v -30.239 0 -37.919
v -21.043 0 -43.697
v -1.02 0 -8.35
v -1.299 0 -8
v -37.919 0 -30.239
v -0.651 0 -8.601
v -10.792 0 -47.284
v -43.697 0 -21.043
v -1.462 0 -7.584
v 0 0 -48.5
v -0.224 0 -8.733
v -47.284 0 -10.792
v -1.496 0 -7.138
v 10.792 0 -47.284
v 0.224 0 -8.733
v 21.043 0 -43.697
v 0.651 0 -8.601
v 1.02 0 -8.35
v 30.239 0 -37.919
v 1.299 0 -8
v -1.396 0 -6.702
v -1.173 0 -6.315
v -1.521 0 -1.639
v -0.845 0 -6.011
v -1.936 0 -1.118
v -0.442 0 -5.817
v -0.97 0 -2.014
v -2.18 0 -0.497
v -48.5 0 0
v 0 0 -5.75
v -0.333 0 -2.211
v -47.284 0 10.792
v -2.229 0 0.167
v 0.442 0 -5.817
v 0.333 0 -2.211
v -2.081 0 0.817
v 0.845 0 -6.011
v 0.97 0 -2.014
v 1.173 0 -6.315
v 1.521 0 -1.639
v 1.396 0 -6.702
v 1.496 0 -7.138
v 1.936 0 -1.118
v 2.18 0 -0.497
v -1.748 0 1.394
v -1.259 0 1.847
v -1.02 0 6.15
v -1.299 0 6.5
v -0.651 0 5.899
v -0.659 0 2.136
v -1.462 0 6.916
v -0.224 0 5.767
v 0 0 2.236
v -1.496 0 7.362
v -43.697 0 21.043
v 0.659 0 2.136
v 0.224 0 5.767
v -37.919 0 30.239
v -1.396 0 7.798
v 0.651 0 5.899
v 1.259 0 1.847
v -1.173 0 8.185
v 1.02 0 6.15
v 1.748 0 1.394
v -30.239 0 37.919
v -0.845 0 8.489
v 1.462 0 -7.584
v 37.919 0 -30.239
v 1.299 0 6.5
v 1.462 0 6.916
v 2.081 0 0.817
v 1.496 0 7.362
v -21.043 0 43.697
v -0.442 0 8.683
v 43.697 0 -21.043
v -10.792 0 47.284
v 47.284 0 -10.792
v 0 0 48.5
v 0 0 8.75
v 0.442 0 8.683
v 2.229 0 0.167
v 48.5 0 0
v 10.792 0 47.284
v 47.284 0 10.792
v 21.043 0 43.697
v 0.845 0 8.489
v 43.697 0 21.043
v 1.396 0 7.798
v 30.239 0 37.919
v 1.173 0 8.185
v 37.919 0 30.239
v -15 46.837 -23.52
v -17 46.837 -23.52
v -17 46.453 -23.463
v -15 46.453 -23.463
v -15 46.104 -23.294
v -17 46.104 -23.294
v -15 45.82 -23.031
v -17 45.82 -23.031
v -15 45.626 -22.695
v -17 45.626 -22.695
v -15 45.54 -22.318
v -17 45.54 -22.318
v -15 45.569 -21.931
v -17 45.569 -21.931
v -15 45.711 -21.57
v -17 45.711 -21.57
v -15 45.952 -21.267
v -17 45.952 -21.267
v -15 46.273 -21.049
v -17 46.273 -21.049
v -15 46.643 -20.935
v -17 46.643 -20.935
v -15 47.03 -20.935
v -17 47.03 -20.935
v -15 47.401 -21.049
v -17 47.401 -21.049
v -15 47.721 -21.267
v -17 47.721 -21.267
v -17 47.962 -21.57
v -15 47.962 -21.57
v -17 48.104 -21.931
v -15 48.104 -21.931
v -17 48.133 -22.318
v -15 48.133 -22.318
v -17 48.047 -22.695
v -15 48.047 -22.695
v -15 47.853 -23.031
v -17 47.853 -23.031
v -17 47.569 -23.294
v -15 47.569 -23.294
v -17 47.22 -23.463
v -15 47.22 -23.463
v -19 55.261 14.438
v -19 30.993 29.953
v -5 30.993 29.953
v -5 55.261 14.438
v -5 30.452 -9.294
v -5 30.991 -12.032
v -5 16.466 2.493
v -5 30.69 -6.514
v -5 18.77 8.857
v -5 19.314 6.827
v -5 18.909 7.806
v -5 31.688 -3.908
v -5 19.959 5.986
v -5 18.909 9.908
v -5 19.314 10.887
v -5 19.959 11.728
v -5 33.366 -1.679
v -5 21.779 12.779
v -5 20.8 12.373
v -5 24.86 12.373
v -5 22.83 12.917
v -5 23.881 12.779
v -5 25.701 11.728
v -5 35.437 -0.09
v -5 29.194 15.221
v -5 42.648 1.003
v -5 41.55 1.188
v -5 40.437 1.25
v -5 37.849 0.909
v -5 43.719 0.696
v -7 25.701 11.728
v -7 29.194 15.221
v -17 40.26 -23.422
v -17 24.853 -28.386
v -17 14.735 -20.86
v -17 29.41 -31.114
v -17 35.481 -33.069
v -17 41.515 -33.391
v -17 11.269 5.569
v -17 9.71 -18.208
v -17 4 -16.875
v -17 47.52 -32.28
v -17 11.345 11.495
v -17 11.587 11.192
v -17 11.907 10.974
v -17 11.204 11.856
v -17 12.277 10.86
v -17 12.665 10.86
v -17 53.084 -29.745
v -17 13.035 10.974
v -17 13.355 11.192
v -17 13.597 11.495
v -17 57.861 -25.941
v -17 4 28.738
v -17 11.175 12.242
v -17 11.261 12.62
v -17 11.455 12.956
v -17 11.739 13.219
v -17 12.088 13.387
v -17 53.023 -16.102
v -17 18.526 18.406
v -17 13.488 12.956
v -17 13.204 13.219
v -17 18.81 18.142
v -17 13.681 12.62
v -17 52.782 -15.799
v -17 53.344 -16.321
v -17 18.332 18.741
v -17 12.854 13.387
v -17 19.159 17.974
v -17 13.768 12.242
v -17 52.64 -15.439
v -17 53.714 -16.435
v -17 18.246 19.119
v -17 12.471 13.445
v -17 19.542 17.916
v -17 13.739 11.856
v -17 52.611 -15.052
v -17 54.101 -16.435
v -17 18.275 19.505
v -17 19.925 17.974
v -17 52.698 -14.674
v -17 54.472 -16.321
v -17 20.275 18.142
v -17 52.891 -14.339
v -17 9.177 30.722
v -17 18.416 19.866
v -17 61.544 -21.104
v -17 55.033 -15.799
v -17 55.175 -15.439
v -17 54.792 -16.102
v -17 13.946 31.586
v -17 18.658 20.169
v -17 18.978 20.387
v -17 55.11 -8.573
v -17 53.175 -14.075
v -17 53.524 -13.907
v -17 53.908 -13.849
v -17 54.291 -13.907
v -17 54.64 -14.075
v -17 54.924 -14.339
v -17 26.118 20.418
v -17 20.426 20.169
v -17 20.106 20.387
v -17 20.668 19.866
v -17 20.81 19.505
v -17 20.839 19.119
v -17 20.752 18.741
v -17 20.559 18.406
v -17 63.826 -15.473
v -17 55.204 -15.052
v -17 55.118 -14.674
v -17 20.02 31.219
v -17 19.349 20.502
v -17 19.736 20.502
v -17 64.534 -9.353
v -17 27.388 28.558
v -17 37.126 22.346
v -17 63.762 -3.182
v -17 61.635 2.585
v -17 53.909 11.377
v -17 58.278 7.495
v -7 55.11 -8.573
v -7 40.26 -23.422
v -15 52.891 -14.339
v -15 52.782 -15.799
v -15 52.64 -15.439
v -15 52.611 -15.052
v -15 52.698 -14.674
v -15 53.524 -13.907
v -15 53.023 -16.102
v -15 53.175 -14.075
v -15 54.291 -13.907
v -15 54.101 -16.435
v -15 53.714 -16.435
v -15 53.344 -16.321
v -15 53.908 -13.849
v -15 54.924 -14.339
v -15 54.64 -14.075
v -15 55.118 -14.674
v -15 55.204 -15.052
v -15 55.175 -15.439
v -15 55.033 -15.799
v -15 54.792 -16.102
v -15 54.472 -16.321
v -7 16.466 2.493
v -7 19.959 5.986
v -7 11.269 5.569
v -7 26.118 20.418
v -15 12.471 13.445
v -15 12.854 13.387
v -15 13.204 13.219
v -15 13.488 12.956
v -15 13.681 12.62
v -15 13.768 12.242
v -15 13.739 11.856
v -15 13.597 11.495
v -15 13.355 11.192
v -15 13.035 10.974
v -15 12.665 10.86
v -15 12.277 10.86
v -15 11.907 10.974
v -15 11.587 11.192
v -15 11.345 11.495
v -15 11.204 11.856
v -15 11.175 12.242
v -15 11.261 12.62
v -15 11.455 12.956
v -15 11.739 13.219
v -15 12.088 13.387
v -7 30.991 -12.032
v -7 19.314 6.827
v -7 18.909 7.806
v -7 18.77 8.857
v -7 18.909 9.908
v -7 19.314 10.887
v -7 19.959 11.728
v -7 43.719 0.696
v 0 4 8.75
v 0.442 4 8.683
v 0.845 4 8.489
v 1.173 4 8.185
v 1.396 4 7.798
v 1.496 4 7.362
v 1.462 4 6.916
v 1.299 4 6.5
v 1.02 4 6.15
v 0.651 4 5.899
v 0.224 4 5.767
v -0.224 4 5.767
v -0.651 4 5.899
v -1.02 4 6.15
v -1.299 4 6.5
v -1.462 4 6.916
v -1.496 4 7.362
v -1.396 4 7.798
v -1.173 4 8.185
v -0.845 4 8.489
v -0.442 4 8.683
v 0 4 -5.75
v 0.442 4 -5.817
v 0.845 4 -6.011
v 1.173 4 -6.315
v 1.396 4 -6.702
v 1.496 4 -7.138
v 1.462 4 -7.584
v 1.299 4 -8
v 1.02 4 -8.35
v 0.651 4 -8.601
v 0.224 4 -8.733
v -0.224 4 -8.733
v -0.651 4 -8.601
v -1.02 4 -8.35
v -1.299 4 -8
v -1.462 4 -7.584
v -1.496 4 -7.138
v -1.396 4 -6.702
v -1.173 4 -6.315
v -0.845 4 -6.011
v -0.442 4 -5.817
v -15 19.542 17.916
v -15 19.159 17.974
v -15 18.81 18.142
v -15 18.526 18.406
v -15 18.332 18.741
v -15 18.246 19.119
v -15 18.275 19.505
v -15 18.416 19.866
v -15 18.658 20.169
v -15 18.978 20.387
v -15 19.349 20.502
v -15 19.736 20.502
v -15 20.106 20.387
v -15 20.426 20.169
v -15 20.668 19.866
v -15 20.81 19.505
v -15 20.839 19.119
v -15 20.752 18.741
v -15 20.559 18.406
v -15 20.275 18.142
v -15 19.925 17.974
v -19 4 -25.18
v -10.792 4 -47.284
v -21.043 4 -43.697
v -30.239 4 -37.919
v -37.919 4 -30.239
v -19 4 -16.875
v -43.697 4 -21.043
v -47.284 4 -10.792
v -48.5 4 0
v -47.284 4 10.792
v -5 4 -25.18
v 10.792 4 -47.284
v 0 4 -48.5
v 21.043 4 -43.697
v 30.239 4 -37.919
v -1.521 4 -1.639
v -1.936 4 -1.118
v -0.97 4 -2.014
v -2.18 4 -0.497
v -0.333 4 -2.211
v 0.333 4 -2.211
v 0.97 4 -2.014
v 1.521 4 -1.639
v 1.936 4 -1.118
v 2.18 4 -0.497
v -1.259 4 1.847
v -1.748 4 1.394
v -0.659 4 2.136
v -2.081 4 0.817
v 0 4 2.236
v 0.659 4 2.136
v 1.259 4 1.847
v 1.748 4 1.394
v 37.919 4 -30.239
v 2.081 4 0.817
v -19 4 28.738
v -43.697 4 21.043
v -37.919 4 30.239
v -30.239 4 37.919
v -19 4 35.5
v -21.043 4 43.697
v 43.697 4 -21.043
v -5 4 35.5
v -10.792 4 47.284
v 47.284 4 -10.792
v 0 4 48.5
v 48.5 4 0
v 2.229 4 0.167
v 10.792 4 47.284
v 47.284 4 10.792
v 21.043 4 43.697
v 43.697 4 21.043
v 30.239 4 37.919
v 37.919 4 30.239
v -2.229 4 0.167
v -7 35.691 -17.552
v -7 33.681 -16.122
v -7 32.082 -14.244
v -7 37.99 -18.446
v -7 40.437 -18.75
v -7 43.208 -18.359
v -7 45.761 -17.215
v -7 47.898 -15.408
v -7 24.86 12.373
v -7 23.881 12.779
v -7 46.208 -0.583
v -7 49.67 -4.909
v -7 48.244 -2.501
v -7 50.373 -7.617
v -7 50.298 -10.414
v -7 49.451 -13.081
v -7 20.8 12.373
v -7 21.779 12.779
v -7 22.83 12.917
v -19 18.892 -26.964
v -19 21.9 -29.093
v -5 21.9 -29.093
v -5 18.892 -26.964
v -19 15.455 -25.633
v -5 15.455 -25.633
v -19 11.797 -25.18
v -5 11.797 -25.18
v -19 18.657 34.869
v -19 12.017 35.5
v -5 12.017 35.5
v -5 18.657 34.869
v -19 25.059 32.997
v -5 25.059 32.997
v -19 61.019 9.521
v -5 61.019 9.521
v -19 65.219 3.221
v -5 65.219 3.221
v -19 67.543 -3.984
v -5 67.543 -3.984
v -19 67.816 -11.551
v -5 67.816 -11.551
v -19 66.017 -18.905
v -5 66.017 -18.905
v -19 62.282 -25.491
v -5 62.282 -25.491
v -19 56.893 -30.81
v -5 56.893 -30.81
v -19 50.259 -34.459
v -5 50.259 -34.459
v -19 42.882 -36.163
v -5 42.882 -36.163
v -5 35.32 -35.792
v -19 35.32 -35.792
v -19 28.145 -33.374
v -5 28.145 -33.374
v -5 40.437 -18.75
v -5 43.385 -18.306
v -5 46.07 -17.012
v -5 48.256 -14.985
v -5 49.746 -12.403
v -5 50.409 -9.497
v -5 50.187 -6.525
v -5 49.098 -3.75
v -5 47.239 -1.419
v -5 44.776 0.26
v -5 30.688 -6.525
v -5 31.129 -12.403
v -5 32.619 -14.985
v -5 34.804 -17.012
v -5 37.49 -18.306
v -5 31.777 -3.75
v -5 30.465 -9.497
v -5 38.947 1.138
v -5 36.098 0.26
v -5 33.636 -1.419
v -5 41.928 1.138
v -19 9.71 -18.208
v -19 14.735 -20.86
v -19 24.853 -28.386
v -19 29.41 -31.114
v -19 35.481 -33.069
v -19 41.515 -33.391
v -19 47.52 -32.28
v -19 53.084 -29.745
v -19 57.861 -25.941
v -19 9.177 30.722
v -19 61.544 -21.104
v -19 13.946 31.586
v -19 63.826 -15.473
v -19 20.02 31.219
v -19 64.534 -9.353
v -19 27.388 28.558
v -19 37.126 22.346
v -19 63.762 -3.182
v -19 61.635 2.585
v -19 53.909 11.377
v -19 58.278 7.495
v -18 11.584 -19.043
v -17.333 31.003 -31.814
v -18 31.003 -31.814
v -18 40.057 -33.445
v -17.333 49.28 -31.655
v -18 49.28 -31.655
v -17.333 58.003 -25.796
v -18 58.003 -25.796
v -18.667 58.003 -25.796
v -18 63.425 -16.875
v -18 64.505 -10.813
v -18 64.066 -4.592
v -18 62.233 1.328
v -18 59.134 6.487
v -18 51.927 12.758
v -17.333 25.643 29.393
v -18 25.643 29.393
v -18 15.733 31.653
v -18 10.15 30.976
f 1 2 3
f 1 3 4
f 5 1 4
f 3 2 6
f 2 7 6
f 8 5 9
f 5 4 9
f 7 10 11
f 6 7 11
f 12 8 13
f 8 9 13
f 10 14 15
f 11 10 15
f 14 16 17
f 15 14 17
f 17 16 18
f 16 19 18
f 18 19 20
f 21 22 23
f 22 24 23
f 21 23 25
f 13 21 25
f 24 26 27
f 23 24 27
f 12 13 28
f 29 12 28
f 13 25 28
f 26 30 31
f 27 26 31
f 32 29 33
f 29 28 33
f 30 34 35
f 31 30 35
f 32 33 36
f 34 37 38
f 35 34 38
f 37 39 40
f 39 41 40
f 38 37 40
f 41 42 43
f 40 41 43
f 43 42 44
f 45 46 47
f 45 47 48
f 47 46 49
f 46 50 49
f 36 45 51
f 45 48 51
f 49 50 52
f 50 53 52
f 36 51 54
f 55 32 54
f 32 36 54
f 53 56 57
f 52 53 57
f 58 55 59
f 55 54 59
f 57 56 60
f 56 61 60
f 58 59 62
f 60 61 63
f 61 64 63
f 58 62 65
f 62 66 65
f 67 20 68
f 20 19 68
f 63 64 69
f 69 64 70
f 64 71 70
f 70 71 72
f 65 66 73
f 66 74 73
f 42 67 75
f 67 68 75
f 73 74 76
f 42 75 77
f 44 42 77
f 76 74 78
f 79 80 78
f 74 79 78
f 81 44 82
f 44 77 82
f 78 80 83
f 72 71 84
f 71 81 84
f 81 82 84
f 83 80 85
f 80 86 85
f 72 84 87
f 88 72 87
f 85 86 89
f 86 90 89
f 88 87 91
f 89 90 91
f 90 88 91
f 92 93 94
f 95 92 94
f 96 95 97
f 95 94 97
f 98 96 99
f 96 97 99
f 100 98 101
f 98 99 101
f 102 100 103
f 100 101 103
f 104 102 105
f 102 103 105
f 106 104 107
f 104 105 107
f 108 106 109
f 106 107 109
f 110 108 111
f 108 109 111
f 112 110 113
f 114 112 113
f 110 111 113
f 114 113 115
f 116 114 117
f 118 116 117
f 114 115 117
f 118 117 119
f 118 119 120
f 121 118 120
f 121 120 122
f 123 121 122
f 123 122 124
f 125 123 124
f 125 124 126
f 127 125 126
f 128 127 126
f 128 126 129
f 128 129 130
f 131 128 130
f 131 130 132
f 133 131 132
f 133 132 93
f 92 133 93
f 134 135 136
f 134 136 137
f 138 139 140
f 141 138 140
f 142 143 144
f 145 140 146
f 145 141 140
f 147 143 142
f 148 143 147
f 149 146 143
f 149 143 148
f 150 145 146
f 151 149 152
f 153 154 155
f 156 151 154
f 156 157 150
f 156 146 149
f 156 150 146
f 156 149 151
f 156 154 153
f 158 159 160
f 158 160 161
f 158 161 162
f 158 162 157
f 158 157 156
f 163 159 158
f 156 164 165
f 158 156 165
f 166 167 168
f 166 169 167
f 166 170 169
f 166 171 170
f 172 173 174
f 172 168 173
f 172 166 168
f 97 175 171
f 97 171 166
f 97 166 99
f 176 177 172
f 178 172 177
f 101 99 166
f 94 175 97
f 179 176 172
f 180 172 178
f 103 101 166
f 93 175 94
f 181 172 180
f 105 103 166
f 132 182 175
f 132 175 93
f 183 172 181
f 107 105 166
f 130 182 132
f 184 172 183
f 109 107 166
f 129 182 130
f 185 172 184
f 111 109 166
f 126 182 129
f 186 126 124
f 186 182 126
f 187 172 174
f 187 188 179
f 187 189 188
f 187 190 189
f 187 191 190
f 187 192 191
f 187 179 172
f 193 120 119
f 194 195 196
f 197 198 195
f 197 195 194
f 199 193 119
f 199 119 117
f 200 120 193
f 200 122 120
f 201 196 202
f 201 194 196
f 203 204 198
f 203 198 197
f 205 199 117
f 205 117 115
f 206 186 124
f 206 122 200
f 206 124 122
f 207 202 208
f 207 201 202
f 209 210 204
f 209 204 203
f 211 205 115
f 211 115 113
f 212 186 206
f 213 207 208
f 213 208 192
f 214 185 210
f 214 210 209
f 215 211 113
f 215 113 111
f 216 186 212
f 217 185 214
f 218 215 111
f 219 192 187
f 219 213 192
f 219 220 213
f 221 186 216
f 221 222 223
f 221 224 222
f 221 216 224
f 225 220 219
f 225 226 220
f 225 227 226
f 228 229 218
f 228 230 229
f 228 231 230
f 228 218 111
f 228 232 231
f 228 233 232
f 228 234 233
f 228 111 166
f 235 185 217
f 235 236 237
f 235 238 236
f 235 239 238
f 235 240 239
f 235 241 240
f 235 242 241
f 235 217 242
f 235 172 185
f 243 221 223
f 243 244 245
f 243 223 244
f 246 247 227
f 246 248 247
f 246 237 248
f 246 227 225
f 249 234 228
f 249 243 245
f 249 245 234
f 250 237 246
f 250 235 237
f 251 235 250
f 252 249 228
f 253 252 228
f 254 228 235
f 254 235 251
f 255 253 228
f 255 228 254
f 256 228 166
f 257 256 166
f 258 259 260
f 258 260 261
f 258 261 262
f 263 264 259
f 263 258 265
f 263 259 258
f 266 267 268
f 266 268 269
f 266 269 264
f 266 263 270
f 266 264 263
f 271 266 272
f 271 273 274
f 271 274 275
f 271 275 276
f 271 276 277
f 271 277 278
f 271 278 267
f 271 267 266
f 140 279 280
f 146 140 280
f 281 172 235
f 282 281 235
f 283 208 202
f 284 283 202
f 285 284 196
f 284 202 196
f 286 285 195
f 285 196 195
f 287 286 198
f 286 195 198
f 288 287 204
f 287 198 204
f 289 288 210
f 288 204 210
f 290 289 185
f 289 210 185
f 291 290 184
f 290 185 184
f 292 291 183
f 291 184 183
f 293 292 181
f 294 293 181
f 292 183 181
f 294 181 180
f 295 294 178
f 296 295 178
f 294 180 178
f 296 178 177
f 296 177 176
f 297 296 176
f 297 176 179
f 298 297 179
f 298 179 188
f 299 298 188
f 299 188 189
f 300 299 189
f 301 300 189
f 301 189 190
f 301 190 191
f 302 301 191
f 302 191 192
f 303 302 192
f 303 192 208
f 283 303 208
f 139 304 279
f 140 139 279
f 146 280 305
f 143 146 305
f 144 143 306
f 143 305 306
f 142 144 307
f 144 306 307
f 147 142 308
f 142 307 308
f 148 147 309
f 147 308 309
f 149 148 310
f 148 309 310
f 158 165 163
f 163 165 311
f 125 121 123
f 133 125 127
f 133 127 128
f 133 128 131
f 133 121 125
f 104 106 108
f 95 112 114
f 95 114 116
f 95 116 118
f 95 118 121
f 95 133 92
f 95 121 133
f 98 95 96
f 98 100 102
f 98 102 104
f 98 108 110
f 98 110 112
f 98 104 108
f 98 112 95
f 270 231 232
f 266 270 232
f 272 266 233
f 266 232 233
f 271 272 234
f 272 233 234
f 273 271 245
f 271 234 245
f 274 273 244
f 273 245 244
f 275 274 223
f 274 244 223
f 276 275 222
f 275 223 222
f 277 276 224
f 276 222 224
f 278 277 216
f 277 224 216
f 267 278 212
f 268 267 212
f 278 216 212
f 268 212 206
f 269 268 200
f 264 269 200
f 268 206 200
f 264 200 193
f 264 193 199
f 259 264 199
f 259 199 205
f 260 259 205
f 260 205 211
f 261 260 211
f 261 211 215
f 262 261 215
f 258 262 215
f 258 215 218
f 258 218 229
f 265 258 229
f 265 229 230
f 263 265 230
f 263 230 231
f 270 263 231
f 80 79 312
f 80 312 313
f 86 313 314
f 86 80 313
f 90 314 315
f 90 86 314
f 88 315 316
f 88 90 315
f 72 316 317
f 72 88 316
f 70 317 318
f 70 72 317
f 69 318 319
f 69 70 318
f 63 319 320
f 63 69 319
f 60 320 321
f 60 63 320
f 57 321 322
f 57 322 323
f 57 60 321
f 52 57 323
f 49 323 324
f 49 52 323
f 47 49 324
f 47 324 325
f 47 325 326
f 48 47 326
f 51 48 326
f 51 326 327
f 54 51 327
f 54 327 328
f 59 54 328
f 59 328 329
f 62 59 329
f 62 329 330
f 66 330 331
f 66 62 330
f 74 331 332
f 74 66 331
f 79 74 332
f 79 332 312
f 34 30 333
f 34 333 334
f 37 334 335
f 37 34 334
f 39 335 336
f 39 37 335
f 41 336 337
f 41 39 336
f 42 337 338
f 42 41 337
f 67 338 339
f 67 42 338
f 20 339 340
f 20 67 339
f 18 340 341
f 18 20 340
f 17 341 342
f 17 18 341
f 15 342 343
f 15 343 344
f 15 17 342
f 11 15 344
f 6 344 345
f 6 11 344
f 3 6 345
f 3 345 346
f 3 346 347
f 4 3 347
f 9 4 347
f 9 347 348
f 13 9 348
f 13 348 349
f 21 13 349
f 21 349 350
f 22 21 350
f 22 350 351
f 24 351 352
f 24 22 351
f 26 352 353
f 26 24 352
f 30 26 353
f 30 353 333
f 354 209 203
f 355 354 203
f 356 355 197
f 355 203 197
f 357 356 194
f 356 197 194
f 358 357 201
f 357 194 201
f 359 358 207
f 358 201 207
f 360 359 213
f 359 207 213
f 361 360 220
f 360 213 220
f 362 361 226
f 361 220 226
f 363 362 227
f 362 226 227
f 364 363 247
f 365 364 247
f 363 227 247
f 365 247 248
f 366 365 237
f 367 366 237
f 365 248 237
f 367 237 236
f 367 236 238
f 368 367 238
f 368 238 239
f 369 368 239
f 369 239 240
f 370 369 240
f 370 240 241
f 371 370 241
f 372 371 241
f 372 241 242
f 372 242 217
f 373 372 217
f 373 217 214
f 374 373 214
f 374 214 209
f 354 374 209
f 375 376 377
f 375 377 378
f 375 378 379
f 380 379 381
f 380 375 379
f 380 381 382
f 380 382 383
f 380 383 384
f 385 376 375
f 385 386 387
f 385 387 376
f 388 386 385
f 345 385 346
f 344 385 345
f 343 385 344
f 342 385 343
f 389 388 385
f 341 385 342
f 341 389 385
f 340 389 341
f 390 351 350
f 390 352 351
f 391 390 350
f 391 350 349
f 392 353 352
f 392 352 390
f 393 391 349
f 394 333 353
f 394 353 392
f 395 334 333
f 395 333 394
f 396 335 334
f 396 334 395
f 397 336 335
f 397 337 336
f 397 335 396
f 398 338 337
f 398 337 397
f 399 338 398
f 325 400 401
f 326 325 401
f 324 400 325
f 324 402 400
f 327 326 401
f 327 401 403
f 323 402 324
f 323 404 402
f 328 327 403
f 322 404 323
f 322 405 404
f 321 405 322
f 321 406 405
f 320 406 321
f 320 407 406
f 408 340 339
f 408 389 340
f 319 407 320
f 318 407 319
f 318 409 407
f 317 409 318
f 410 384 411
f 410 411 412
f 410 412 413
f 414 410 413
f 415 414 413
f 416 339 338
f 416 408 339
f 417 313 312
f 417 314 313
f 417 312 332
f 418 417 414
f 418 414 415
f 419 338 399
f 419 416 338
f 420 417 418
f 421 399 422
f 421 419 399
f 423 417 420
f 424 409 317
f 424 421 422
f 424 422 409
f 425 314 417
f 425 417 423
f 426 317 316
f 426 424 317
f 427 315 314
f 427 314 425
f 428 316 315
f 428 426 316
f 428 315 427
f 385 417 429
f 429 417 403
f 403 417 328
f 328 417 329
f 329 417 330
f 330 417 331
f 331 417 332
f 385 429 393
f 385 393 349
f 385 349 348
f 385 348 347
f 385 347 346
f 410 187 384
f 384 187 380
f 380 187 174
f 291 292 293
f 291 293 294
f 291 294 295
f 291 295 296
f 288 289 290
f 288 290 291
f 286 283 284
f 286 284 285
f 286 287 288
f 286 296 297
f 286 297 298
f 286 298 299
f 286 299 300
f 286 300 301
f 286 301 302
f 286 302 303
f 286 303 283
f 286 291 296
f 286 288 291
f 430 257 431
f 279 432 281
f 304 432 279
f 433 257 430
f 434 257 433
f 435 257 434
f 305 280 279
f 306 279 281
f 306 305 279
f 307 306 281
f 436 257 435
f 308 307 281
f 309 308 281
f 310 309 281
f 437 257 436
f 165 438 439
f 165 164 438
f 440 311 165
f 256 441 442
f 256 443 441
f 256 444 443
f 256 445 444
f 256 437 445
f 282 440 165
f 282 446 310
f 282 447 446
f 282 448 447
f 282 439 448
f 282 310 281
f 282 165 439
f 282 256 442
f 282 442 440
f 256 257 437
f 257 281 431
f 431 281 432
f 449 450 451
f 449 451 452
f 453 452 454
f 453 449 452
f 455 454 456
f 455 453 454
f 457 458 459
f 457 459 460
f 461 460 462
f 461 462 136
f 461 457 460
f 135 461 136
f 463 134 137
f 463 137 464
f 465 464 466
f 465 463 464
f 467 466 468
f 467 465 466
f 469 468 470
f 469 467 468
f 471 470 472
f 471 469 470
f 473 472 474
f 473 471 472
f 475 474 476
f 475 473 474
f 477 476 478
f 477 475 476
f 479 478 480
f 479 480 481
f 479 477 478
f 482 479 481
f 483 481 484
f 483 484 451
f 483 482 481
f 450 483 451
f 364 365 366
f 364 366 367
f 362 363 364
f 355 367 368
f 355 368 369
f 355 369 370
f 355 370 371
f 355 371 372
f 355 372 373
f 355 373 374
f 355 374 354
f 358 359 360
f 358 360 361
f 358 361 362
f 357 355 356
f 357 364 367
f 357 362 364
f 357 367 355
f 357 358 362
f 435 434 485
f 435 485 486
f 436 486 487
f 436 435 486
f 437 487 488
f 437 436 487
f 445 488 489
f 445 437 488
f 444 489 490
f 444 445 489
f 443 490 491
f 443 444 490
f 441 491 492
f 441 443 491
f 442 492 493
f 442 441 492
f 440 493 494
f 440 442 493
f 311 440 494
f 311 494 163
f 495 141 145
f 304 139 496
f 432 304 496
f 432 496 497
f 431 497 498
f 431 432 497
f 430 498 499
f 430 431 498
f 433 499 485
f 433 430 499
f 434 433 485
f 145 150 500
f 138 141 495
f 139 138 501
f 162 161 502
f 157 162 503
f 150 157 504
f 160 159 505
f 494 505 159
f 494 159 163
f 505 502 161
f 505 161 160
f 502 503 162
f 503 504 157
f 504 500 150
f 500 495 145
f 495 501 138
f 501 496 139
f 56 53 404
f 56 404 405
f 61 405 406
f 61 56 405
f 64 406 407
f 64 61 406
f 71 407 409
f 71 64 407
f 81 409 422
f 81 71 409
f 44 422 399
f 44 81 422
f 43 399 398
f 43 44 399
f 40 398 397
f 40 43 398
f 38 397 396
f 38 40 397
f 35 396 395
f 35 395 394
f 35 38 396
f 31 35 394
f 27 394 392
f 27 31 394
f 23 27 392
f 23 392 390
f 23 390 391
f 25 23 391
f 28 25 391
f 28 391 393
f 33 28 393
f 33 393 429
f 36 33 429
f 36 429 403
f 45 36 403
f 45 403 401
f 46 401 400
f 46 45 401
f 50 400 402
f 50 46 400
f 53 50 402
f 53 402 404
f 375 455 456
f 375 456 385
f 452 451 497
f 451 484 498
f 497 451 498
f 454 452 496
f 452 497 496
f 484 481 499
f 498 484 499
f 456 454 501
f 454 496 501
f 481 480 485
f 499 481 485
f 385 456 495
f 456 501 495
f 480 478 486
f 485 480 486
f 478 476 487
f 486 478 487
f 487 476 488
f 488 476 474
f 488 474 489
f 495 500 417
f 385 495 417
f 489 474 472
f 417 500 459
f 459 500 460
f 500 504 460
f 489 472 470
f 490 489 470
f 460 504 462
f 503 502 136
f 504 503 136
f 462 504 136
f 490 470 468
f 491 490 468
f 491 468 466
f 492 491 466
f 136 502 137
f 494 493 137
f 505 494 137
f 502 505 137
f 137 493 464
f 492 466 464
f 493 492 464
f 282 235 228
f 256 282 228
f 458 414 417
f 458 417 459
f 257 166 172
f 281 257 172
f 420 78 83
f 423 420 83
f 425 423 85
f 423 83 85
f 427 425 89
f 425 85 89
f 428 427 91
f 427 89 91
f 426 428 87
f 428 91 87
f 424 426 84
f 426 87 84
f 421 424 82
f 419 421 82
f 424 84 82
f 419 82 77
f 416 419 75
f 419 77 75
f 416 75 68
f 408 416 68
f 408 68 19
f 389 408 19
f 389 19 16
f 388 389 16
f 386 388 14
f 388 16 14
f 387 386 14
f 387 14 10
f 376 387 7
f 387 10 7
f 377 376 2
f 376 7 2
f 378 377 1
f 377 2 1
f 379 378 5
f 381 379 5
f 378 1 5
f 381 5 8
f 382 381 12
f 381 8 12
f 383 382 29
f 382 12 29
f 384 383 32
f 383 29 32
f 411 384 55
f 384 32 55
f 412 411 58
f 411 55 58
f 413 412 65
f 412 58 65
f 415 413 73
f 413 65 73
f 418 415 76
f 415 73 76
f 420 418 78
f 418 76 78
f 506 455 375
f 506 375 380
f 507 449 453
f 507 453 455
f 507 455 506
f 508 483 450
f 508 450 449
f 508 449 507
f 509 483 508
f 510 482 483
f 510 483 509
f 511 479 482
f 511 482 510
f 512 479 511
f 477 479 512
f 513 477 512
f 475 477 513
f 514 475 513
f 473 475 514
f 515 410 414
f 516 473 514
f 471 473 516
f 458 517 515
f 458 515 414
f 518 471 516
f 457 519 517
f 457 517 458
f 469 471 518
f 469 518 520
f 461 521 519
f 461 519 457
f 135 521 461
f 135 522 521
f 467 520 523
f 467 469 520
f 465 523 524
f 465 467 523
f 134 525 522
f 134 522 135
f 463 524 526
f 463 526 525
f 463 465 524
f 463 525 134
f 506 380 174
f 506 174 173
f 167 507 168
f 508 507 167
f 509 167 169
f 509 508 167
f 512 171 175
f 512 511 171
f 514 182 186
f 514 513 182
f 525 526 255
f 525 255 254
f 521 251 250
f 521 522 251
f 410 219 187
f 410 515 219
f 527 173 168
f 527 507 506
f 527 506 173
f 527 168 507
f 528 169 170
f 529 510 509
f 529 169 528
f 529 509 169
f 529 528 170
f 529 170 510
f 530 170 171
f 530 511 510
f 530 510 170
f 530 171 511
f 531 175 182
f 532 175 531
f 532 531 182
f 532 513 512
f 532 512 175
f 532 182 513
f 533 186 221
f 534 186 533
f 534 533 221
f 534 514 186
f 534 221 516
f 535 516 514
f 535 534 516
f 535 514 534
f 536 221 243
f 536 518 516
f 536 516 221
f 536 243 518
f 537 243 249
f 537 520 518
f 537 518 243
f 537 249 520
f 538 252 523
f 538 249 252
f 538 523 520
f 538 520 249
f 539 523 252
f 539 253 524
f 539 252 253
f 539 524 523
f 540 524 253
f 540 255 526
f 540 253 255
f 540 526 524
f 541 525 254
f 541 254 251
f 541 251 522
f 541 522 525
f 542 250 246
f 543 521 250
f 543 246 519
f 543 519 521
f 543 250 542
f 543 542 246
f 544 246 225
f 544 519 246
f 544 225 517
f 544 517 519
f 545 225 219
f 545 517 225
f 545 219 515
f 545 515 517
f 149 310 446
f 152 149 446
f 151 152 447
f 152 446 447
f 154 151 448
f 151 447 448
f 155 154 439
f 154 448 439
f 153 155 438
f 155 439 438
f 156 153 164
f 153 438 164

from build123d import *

# Parameters (mm, degrees)
SKETCH1_R                = 48.5
SKETCH1_R_2              = 1.5
SKETCH1_R_3              = 2.235591035
BOSS_EXTRUDE2_DEPTH      = 4
BOSS_EXTRUDE3_DEPTH      = 0.0001
BOSS_EXTRUDE3_DEPTH_BACK = 14
SKETCH6_R                = 10
CUT_EXTRUDE1_DEPTH       = 12
SKETCH11_R               = 1.3
CUT_EXTRUDE3_DEPTH       = 4
CUT_EXTRUDE4_DEPTH       = 2
CUT_EXTRUDE5_DEPTH       = 2


with BuildPart() as part:
    # Sketch1 → Boss-Extrude2 (new body)
    with BuildSketch(Plane(origin=(0, 0, 0), x_dir=(1, 0, 0), z_dir=(0, 1, 0))):
        with Locations(Location((0, 0, 0), (0, 0, 270))):
            Circle(SKETCH1_R)
        with Locations(Location((0, 7.25, 0), (0, 0, 270))):
            Circle(SKETCH1_R_2, mode=Mode.SUBTRACT)
        with Locations(Location((0, -7.25, 0), (0, 0, 270))):
            Circle(SKETCH1_R_2, mode=Mode.SUBTRACT)
        with Locations(Location((0, 0, 0), (0, 0, 270))):
            Circle(SKETCH1_R_3, mode=Mode.SUBTRACT)
    extrude(amount=BOSS_EXTRUDE2_DEPTH)

    # Sketch6 → Boss-Extrude3 (add, two sides: drawn at the far end of the back side and taken through both)
    with BuildSketch(Plane(origin=(-5, 0, 0), x_dir=(0, 0, -1), z_dir=(1, 0, 0)).offset(-BOSS_EXTRUDE3_DEPTH_BACK)):
        with BuildLine():
            Line((25.18, 4), (-35.5, 4))
            Line((-35.5, 4), (-35.5, 12.01726107))
            ThreePointArc((-35.5, 12.01726107), (-34.084736696, 21.902425823), (-29.952654999, 30.993374798))
            Line((-29.952654999, 30.993374798), (-14.438105641, 55.261411059))
            ThreePointArc((-14.438105641, 55.261411059), (25.491097233, 62.28169582), (29.092718415, 21.900339167))
            ThreePointArc((29.092718415, 21.900339167), (26.192340729, 17.214399439), (25.18, 11.79726107))
            Line((25.18, 11.79726107), (25.18, 4))
        make_face()
        with Locations((8.75, 40.43726107)):
            Circle(SKETCH6_R, mode=Mode.SUBTRACT)
    extrude(amount=BOSS_EXTRUDE3_DEPTH + BOSS_EXTRUDE3_DEPTH_BACK)

    # Sketch9 → Cut-Extrude1 (cut)
    with BuildSketch(Plane.ZY.offset(19)):
        Polygon((5.568912319, 11.269106346), (20.418154724, 26.118348751), (-8.573223305, 55.109726779), (-23.42246571, 40.260484374), align=None)
    extrude(amount=-CUT_EXTRUDE1_DEPTH, mode=Mode.SUBTRACT)

    # Sketch11 → Cut-Extrude3 (cut)
    with BuildSketch(Plane.ZY.offset(19)):
        with Locations((-15.14931637, 53.907645251)):
            Circle(SKETCH11_R)
        with Locations(Location((-22.220384182, 46.836577439, 0), (0, 0, 180))):
            Circle(SKETCH11_R)
        with Locations((12.145005384, 12.471187874)):
            Circle(SKETCH11_R)
        with Locations(Location((19.216073196, 19.542255686, 0), (0, 0, 180))):
            Circle(SKETCH11_R)
    extrude(amount=-CUT_EXTRUDE3_DEPTH, mode=Mode.SUBTRACT)

    # Sketch16 → Cut-Extrude4 (cut)
    with BuildSketch(Plane.ZY.offset(19)):
        with BuildLine():
            Line((-16.875075084, 4), (28.737520082, 4))
            add(Edge.make_bspline(
                [(-16.875075084, 4), (-17.737013272, 15.160077135), (-34.124977495, 25.159288994), (-33.933000746, 51.000691554), (-17.215111481, 67.555057226), (7.98292021, 62.524626035), (20.715664688, 35.805630134), (37.029137104, 21.254502483), (28.737520082, 4)],
                knots=[0, 0, 0, 0, 0.199147198, 0.31666239, 0.448197293, 0.600919397, 0.725180292, 1, 1, 1, 1], degree=3))
        make_face()
    extrude(amount=-CUT_EXTRUDE4_DEPTH, mode=Mode.SUBTRACT)

    # Sketch18 → Cut-Extrude5 (cut)
    with BuildSketch(Plane.ZY.offset(7)):
        with BuildLine():
            Line((11.727812383, 19.959448687), (8.856958852, 22.830302218))
            Line((8.856958852, 22.830302218), (5.98610532, 19.959448687))
            ThreePointArc((5.98610532, 19.959448687), (8.856958852, 18.770302218), (11.727812383, 19.959448687))
        make_face()
        with BuildLine():
            Line((11.727812383, 25.70115575), (8.856958852, 22.830302218))
            Line((8.856958852, 22.830302218), (11.727812383, 19.959448687))
            ThreePointArc((11.727812383, 19.959448687), (12.916958852, 22.830302218), (11.727812383, 25.70115575))
        make_face()
        with BuildLine():
            ThreePointArc((1.25, 40.43726107), (0.488795325, 36.610426746), (-1.678932188, 33.366193258))
            Line((-1.678932188, 33.366193258), (8.856958852, 22.830302218))
            Line((8.856958852, 22.830302218), (11.727812383, 25.70115575))
            Line((11.727812383, 25.70115575), (15.220919882, 29.194263249))
            Line((15.220919882, 29.194263249), (0.696168032, 43.719015099))
            ThreePointArc((0.696168032, 43.719015099), (1.110569971, 42.101340346), (1.25, 40.43726107))
        make_face()
        with BuildLine():
            Line((8.856958852, 22.830302218), (-1.678932188, 33.366193258))
            ThreePointArc((-1.678932188, 33.366193258), (-6.513932022, 30.690466725), (-12.031754029, 30.991093038))
            Line((-12.031754029, 30.991093038), (2.492997821, 16.466341187))
            Line((2.492997821, 16.466341187), (5.98610532, 19.959448687))
            Line((5.98610532, 19.959448687), (8.856958852, 22.830302218))
        make_face()
    extrude(amount=-CUT_EXTRUDE5_DEPTH, mode=Mode.SUBTRACT)


solid = part.part
